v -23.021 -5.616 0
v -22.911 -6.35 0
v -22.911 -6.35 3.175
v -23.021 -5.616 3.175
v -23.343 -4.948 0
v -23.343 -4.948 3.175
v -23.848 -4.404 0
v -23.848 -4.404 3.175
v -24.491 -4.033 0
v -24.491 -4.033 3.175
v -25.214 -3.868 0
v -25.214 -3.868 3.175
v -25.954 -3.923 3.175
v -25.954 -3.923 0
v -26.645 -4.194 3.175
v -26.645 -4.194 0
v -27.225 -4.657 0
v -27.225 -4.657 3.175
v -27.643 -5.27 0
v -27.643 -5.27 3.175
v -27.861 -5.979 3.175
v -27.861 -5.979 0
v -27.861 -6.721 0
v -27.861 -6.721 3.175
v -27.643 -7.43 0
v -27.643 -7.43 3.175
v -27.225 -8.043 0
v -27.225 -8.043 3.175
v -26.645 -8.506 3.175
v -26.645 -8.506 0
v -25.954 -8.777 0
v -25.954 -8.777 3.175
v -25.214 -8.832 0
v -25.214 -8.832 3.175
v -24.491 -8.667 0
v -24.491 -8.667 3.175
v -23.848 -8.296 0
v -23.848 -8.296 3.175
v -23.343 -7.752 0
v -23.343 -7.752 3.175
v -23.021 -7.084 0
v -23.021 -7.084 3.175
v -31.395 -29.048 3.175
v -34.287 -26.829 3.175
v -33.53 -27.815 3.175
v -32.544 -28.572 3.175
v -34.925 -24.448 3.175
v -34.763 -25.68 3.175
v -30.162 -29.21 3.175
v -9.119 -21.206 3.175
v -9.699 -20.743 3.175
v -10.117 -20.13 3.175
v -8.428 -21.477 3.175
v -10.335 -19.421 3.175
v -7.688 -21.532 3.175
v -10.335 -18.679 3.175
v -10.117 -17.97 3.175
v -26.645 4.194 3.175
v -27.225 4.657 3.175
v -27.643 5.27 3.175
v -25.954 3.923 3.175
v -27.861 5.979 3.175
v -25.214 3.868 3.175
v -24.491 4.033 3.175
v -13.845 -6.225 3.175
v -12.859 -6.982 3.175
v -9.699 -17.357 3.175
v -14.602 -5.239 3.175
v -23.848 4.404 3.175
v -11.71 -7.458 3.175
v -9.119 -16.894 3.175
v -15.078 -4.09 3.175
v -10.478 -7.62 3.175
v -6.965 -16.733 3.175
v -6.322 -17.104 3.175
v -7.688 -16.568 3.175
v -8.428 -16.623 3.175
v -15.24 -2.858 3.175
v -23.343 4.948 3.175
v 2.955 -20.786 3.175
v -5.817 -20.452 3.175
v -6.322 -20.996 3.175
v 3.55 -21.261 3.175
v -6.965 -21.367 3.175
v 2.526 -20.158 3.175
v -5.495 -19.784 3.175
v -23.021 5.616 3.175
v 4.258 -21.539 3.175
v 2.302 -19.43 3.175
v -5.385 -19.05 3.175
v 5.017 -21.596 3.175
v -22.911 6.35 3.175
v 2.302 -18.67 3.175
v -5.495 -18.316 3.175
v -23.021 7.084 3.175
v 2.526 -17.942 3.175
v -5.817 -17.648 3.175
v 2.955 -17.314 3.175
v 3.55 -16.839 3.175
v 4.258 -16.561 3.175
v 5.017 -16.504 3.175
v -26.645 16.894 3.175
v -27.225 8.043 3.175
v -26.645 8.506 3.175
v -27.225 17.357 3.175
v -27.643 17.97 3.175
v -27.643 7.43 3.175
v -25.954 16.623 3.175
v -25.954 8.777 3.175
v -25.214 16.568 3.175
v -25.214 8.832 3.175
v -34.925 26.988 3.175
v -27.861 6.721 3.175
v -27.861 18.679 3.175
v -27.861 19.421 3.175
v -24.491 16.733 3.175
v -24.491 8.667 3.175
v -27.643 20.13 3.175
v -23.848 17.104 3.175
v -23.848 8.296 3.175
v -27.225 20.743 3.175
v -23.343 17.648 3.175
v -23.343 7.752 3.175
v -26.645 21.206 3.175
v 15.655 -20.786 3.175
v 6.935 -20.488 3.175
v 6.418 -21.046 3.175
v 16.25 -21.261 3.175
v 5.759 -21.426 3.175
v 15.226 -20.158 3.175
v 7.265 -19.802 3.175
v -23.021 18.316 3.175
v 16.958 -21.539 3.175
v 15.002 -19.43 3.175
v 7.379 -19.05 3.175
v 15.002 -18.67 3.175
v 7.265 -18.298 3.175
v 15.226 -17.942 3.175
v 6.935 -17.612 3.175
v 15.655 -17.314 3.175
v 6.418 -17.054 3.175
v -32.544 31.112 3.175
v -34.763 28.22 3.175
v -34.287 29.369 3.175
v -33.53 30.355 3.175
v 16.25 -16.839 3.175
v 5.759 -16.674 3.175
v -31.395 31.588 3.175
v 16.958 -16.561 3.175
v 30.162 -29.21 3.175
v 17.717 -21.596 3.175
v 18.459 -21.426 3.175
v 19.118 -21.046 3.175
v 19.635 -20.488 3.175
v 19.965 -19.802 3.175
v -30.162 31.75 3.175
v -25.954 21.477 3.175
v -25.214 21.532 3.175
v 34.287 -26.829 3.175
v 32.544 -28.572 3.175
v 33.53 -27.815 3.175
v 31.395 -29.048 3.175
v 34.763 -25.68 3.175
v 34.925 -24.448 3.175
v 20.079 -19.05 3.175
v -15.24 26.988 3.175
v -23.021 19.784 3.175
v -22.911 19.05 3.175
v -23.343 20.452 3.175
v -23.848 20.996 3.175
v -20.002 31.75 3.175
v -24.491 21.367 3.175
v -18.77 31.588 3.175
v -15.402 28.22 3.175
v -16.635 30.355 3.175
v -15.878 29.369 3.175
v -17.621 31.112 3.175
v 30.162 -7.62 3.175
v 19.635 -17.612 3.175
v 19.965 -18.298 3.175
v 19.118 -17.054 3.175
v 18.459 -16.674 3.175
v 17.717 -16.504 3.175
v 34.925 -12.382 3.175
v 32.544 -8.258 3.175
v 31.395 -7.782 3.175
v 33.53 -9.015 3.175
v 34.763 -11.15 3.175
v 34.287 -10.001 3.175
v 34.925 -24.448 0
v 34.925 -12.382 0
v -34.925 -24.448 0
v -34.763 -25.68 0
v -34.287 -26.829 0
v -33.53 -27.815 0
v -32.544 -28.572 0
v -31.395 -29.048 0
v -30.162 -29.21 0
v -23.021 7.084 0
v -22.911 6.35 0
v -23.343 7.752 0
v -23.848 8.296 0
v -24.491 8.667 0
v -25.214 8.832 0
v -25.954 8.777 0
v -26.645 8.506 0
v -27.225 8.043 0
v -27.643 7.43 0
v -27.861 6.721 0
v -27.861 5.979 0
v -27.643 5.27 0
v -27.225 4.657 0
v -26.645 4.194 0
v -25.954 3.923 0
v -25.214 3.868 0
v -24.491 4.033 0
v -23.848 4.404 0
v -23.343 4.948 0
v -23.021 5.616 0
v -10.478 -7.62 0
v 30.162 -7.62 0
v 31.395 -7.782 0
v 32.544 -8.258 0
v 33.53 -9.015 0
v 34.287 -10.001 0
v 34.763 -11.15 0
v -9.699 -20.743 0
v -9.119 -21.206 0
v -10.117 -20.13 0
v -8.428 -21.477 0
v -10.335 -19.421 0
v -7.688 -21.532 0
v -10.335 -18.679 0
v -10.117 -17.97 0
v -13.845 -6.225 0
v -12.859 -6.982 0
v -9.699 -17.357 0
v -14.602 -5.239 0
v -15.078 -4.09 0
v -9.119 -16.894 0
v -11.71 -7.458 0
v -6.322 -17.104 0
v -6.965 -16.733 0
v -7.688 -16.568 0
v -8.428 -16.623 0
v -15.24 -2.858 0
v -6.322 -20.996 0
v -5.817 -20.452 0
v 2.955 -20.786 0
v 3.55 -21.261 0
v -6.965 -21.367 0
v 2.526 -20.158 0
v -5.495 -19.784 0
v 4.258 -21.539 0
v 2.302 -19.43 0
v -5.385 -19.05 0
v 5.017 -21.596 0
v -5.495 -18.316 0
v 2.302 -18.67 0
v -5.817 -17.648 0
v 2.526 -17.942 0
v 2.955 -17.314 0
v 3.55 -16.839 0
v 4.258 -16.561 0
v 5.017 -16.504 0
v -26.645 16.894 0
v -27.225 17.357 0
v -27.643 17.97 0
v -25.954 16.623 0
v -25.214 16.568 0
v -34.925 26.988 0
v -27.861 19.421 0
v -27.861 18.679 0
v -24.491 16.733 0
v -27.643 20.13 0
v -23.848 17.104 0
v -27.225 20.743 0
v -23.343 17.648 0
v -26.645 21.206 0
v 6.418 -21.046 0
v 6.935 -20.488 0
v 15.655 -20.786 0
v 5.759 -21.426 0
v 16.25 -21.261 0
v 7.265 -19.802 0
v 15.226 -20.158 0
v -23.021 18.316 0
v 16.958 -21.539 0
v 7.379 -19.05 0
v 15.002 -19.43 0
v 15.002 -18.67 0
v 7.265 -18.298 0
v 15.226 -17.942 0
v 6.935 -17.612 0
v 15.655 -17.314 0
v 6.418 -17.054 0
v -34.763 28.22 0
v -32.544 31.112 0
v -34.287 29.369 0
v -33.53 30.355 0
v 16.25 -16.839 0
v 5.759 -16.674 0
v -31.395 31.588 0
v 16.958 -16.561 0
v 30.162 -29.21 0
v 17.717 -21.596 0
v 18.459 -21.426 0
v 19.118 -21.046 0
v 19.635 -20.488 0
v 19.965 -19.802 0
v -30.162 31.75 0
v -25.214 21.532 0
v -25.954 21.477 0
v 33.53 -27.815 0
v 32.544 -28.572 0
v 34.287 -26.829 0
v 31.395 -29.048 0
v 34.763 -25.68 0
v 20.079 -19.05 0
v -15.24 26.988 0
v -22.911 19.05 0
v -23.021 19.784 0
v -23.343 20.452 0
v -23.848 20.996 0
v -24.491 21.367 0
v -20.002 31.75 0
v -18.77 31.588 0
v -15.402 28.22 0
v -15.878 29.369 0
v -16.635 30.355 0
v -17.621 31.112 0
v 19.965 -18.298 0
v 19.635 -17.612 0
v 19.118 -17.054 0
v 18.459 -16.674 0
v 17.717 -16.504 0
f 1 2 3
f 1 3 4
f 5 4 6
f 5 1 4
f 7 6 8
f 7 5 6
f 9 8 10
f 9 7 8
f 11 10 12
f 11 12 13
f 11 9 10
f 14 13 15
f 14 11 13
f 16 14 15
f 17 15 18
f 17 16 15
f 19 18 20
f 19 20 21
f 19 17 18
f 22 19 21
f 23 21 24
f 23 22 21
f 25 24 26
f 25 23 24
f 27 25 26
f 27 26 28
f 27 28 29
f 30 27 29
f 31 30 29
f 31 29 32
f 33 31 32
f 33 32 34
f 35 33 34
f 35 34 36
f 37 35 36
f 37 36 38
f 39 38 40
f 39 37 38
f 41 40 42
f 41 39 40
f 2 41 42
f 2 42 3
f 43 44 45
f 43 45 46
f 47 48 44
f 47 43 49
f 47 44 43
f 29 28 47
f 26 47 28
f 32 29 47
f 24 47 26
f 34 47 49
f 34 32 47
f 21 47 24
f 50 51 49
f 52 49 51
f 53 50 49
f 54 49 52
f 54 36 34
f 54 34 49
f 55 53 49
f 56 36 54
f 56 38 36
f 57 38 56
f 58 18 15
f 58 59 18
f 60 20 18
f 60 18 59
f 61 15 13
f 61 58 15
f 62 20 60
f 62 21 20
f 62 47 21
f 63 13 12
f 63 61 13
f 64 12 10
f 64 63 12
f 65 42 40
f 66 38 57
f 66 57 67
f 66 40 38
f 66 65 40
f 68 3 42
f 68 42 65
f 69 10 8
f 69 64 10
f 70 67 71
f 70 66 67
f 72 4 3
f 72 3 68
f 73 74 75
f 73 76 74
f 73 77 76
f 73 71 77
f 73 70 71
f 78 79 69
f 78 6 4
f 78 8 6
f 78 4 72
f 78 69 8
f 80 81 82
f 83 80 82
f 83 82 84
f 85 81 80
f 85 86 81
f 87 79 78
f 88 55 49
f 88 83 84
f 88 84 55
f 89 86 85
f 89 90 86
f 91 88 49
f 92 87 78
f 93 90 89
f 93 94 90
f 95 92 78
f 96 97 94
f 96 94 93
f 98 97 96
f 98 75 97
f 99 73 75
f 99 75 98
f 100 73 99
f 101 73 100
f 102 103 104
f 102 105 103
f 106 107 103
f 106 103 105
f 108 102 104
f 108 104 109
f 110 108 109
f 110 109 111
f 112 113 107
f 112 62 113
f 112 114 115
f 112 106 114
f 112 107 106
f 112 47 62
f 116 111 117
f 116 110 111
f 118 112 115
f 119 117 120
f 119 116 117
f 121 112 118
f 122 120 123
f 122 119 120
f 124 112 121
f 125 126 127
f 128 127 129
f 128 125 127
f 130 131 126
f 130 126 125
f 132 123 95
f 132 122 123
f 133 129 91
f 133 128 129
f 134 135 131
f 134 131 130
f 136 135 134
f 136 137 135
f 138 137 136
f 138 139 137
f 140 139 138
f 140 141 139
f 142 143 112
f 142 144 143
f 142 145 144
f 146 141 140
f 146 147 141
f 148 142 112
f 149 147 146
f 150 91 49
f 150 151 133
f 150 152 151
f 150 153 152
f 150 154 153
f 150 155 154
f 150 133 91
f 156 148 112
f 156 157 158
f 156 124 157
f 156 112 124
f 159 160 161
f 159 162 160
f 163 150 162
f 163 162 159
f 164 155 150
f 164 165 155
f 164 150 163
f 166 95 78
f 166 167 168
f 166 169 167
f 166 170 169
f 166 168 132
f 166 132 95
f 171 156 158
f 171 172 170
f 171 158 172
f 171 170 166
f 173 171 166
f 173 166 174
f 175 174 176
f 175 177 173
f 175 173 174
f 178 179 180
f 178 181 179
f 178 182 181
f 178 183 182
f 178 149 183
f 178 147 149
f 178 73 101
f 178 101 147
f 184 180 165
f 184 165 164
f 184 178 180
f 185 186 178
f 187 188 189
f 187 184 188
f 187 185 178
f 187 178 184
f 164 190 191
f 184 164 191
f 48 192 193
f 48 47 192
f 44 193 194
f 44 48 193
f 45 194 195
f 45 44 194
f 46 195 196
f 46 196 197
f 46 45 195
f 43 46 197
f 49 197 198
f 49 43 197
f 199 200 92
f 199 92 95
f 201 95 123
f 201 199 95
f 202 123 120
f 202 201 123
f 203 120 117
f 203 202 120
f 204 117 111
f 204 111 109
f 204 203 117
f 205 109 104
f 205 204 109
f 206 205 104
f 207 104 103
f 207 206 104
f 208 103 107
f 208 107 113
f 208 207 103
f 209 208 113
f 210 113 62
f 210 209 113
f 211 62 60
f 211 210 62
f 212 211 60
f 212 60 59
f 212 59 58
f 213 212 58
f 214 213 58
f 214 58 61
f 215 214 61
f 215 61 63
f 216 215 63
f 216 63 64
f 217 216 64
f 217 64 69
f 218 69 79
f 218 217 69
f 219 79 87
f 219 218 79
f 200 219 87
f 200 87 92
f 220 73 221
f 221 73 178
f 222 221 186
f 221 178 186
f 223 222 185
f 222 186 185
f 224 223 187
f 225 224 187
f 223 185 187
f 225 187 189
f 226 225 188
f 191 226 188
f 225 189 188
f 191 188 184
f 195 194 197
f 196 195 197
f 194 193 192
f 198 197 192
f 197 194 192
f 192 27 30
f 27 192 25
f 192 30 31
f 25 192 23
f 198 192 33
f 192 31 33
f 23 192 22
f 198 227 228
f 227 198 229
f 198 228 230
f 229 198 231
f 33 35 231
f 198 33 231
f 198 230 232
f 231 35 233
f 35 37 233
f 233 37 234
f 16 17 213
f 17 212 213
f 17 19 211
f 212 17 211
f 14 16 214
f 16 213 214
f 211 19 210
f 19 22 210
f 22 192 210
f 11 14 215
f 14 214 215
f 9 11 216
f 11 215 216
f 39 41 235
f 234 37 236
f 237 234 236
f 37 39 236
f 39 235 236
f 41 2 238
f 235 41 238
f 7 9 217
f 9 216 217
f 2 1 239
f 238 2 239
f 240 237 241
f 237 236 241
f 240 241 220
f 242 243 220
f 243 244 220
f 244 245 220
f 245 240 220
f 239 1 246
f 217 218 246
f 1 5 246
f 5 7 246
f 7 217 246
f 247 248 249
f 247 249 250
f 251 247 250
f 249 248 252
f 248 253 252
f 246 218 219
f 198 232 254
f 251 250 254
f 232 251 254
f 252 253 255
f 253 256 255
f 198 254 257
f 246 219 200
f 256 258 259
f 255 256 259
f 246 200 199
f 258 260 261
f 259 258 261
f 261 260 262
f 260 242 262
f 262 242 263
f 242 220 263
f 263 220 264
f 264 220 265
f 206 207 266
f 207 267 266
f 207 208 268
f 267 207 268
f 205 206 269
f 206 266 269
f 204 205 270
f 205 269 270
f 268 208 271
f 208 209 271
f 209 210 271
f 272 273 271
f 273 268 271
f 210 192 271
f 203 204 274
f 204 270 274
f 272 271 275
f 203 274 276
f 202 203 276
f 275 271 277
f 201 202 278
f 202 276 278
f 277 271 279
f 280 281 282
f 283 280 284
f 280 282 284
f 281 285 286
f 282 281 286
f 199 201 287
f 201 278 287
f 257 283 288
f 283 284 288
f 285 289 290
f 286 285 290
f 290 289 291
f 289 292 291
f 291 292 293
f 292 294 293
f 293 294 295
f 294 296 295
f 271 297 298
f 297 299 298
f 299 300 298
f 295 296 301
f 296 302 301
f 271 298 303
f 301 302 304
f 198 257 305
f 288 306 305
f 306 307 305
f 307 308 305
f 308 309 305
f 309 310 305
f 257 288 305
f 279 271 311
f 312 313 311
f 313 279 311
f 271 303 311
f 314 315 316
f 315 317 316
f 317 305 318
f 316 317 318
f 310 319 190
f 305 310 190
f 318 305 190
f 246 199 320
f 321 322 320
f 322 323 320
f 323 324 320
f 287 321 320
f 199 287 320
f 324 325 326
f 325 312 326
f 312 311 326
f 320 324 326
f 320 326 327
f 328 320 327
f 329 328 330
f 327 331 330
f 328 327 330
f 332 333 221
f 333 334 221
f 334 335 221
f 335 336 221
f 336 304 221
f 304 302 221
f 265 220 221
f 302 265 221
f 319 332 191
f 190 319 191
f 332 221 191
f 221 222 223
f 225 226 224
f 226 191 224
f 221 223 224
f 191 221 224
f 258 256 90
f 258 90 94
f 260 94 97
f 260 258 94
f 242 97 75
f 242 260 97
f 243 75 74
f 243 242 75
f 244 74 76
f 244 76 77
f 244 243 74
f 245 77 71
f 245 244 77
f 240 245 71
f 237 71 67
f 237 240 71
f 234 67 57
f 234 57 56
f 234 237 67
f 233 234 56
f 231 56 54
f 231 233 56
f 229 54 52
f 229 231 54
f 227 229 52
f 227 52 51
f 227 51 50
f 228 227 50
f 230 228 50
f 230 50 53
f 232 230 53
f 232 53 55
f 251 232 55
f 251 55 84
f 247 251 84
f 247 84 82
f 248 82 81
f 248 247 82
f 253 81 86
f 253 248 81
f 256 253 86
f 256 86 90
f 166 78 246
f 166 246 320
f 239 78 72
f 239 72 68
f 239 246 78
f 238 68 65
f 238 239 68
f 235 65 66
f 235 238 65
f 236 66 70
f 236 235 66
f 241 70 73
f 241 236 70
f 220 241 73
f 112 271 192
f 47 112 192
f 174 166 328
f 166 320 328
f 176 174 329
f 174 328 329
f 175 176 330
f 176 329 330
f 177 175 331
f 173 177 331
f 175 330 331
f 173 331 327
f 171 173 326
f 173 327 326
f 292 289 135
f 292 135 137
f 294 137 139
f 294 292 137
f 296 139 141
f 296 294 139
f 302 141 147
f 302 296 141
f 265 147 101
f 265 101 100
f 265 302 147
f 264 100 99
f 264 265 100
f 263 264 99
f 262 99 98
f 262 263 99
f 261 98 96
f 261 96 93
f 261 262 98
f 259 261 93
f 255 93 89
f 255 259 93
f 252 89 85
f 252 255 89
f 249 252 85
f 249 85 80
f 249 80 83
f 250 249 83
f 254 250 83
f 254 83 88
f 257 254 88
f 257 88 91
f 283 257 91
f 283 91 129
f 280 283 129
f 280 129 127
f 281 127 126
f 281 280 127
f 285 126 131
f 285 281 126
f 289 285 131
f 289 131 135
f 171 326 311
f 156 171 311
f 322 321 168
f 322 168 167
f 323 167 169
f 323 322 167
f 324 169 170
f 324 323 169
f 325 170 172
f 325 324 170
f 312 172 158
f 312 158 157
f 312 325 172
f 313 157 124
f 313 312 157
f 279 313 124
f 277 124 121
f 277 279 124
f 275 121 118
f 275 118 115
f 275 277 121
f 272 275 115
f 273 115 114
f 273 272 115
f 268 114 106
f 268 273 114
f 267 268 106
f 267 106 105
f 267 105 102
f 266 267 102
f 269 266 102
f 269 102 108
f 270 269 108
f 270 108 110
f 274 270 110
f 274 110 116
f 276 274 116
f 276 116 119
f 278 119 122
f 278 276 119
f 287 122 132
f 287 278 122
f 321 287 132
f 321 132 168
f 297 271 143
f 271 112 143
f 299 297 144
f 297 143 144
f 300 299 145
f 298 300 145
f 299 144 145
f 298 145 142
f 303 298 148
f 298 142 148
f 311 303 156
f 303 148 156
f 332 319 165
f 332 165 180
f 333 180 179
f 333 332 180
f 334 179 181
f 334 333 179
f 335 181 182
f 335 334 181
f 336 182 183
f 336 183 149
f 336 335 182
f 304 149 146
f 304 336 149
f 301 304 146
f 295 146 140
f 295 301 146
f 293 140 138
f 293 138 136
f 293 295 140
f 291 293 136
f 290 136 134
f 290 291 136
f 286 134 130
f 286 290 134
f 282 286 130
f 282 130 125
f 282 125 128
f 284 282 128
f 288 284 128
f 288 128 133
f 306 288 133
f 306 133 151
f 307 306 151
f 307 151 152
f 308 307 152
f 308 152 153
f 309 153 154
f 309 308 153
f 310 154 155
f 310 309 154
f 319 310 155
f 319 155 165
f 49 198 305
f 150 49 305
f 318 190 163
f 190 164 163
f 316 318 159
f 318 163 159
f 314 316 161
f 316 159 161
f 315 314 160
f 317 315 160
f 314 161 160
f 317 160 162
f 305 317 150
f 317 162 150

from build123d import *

# Parameters (mm, degrees)
SKETCH1_R           = 2.4892
SKETCH1_R_2         = 2.5527
BOSS_EXTRUDE1_DEPTH = 3.175
SKETCH2_W           = 4.445
SKETCH2_H           = 39.37
CUT_EXTRUDE1_DEPTH  = 4.175
FILLET2_R           = 4.7625


with BuildPart() as part:
    # Sketch1 → Boss-Extrude1 (new body)
    with BuildSketch(Plane.XY):
        Polygon((-34.925, 31.75), (-34.925, -29.21), (34.925, -29.21), (34.925, -7.62), (-10.795, -7.62), (-10.795, 31.75), align=None)
        with Locations((-25.4, -19.05)):
            Circle(SKETCH1_R, mode=Mode.SUBTRACT)
        with Locations((-7.874, -19.05)):
            Circle(SKETCH1_R, mode=Mode.SUBTRACT)
        with Locations((-25.4, -6.35)):
            Circle(SKETCH1_R, mode=Mode.SUBTRACT)
        with Locations((4.826, -19.05)):
            Circle(SKETCH1_R_2, mode=Mode.SUBTRACT)
        with Locations((17.526, -19.05)):
            Circle(SKETCH1_R_2, mode=Mode.SUBTRACT)
        with Locations((-25.4, 6.35)):
            Circle(SKETCH1_R, mode=Mode.SUBTRACT)
        with Locations((-25.4, 19.05)):
            Circle(SKETCH1_R, mode=Mode.SUBTRACT)
        with Locations((-25.4, -19.05)):
            Circle(SKETCH1_R)
    extrude(amount=BOSS_EXTRUDE1_DEPTH)

    # Sketch2 → Cut-Extrude1 (cut, through all)
    with BuildSketch(Plane.XY.offset(3.175)):
        with Locations((-13.0175, 12.065)):
            Rectangle(SKETCH2_W, SKETCH2_H)
    extrude(amount=-CUT_EXTRUDE1_DEPTH, mode=Mode.SUBTRACT)

    # Fillet2
    fillet2_edges = [part.edges().sort_by_distance(p)[0] for p in [
        (-34.925, 31.75, 1.5875),
        (34.925, -7.62, 1.5875),
        (34.925, -29.21, 1.5875),
        (-34.925, -29.21, 1.5875),
        (-15.24, -7.62, 1.5875),
        (-15.24, 31.75, 1.5875),
    ]]
    fillet(fillet2_edges, radius=FILLET2_R)


solid = part.part
